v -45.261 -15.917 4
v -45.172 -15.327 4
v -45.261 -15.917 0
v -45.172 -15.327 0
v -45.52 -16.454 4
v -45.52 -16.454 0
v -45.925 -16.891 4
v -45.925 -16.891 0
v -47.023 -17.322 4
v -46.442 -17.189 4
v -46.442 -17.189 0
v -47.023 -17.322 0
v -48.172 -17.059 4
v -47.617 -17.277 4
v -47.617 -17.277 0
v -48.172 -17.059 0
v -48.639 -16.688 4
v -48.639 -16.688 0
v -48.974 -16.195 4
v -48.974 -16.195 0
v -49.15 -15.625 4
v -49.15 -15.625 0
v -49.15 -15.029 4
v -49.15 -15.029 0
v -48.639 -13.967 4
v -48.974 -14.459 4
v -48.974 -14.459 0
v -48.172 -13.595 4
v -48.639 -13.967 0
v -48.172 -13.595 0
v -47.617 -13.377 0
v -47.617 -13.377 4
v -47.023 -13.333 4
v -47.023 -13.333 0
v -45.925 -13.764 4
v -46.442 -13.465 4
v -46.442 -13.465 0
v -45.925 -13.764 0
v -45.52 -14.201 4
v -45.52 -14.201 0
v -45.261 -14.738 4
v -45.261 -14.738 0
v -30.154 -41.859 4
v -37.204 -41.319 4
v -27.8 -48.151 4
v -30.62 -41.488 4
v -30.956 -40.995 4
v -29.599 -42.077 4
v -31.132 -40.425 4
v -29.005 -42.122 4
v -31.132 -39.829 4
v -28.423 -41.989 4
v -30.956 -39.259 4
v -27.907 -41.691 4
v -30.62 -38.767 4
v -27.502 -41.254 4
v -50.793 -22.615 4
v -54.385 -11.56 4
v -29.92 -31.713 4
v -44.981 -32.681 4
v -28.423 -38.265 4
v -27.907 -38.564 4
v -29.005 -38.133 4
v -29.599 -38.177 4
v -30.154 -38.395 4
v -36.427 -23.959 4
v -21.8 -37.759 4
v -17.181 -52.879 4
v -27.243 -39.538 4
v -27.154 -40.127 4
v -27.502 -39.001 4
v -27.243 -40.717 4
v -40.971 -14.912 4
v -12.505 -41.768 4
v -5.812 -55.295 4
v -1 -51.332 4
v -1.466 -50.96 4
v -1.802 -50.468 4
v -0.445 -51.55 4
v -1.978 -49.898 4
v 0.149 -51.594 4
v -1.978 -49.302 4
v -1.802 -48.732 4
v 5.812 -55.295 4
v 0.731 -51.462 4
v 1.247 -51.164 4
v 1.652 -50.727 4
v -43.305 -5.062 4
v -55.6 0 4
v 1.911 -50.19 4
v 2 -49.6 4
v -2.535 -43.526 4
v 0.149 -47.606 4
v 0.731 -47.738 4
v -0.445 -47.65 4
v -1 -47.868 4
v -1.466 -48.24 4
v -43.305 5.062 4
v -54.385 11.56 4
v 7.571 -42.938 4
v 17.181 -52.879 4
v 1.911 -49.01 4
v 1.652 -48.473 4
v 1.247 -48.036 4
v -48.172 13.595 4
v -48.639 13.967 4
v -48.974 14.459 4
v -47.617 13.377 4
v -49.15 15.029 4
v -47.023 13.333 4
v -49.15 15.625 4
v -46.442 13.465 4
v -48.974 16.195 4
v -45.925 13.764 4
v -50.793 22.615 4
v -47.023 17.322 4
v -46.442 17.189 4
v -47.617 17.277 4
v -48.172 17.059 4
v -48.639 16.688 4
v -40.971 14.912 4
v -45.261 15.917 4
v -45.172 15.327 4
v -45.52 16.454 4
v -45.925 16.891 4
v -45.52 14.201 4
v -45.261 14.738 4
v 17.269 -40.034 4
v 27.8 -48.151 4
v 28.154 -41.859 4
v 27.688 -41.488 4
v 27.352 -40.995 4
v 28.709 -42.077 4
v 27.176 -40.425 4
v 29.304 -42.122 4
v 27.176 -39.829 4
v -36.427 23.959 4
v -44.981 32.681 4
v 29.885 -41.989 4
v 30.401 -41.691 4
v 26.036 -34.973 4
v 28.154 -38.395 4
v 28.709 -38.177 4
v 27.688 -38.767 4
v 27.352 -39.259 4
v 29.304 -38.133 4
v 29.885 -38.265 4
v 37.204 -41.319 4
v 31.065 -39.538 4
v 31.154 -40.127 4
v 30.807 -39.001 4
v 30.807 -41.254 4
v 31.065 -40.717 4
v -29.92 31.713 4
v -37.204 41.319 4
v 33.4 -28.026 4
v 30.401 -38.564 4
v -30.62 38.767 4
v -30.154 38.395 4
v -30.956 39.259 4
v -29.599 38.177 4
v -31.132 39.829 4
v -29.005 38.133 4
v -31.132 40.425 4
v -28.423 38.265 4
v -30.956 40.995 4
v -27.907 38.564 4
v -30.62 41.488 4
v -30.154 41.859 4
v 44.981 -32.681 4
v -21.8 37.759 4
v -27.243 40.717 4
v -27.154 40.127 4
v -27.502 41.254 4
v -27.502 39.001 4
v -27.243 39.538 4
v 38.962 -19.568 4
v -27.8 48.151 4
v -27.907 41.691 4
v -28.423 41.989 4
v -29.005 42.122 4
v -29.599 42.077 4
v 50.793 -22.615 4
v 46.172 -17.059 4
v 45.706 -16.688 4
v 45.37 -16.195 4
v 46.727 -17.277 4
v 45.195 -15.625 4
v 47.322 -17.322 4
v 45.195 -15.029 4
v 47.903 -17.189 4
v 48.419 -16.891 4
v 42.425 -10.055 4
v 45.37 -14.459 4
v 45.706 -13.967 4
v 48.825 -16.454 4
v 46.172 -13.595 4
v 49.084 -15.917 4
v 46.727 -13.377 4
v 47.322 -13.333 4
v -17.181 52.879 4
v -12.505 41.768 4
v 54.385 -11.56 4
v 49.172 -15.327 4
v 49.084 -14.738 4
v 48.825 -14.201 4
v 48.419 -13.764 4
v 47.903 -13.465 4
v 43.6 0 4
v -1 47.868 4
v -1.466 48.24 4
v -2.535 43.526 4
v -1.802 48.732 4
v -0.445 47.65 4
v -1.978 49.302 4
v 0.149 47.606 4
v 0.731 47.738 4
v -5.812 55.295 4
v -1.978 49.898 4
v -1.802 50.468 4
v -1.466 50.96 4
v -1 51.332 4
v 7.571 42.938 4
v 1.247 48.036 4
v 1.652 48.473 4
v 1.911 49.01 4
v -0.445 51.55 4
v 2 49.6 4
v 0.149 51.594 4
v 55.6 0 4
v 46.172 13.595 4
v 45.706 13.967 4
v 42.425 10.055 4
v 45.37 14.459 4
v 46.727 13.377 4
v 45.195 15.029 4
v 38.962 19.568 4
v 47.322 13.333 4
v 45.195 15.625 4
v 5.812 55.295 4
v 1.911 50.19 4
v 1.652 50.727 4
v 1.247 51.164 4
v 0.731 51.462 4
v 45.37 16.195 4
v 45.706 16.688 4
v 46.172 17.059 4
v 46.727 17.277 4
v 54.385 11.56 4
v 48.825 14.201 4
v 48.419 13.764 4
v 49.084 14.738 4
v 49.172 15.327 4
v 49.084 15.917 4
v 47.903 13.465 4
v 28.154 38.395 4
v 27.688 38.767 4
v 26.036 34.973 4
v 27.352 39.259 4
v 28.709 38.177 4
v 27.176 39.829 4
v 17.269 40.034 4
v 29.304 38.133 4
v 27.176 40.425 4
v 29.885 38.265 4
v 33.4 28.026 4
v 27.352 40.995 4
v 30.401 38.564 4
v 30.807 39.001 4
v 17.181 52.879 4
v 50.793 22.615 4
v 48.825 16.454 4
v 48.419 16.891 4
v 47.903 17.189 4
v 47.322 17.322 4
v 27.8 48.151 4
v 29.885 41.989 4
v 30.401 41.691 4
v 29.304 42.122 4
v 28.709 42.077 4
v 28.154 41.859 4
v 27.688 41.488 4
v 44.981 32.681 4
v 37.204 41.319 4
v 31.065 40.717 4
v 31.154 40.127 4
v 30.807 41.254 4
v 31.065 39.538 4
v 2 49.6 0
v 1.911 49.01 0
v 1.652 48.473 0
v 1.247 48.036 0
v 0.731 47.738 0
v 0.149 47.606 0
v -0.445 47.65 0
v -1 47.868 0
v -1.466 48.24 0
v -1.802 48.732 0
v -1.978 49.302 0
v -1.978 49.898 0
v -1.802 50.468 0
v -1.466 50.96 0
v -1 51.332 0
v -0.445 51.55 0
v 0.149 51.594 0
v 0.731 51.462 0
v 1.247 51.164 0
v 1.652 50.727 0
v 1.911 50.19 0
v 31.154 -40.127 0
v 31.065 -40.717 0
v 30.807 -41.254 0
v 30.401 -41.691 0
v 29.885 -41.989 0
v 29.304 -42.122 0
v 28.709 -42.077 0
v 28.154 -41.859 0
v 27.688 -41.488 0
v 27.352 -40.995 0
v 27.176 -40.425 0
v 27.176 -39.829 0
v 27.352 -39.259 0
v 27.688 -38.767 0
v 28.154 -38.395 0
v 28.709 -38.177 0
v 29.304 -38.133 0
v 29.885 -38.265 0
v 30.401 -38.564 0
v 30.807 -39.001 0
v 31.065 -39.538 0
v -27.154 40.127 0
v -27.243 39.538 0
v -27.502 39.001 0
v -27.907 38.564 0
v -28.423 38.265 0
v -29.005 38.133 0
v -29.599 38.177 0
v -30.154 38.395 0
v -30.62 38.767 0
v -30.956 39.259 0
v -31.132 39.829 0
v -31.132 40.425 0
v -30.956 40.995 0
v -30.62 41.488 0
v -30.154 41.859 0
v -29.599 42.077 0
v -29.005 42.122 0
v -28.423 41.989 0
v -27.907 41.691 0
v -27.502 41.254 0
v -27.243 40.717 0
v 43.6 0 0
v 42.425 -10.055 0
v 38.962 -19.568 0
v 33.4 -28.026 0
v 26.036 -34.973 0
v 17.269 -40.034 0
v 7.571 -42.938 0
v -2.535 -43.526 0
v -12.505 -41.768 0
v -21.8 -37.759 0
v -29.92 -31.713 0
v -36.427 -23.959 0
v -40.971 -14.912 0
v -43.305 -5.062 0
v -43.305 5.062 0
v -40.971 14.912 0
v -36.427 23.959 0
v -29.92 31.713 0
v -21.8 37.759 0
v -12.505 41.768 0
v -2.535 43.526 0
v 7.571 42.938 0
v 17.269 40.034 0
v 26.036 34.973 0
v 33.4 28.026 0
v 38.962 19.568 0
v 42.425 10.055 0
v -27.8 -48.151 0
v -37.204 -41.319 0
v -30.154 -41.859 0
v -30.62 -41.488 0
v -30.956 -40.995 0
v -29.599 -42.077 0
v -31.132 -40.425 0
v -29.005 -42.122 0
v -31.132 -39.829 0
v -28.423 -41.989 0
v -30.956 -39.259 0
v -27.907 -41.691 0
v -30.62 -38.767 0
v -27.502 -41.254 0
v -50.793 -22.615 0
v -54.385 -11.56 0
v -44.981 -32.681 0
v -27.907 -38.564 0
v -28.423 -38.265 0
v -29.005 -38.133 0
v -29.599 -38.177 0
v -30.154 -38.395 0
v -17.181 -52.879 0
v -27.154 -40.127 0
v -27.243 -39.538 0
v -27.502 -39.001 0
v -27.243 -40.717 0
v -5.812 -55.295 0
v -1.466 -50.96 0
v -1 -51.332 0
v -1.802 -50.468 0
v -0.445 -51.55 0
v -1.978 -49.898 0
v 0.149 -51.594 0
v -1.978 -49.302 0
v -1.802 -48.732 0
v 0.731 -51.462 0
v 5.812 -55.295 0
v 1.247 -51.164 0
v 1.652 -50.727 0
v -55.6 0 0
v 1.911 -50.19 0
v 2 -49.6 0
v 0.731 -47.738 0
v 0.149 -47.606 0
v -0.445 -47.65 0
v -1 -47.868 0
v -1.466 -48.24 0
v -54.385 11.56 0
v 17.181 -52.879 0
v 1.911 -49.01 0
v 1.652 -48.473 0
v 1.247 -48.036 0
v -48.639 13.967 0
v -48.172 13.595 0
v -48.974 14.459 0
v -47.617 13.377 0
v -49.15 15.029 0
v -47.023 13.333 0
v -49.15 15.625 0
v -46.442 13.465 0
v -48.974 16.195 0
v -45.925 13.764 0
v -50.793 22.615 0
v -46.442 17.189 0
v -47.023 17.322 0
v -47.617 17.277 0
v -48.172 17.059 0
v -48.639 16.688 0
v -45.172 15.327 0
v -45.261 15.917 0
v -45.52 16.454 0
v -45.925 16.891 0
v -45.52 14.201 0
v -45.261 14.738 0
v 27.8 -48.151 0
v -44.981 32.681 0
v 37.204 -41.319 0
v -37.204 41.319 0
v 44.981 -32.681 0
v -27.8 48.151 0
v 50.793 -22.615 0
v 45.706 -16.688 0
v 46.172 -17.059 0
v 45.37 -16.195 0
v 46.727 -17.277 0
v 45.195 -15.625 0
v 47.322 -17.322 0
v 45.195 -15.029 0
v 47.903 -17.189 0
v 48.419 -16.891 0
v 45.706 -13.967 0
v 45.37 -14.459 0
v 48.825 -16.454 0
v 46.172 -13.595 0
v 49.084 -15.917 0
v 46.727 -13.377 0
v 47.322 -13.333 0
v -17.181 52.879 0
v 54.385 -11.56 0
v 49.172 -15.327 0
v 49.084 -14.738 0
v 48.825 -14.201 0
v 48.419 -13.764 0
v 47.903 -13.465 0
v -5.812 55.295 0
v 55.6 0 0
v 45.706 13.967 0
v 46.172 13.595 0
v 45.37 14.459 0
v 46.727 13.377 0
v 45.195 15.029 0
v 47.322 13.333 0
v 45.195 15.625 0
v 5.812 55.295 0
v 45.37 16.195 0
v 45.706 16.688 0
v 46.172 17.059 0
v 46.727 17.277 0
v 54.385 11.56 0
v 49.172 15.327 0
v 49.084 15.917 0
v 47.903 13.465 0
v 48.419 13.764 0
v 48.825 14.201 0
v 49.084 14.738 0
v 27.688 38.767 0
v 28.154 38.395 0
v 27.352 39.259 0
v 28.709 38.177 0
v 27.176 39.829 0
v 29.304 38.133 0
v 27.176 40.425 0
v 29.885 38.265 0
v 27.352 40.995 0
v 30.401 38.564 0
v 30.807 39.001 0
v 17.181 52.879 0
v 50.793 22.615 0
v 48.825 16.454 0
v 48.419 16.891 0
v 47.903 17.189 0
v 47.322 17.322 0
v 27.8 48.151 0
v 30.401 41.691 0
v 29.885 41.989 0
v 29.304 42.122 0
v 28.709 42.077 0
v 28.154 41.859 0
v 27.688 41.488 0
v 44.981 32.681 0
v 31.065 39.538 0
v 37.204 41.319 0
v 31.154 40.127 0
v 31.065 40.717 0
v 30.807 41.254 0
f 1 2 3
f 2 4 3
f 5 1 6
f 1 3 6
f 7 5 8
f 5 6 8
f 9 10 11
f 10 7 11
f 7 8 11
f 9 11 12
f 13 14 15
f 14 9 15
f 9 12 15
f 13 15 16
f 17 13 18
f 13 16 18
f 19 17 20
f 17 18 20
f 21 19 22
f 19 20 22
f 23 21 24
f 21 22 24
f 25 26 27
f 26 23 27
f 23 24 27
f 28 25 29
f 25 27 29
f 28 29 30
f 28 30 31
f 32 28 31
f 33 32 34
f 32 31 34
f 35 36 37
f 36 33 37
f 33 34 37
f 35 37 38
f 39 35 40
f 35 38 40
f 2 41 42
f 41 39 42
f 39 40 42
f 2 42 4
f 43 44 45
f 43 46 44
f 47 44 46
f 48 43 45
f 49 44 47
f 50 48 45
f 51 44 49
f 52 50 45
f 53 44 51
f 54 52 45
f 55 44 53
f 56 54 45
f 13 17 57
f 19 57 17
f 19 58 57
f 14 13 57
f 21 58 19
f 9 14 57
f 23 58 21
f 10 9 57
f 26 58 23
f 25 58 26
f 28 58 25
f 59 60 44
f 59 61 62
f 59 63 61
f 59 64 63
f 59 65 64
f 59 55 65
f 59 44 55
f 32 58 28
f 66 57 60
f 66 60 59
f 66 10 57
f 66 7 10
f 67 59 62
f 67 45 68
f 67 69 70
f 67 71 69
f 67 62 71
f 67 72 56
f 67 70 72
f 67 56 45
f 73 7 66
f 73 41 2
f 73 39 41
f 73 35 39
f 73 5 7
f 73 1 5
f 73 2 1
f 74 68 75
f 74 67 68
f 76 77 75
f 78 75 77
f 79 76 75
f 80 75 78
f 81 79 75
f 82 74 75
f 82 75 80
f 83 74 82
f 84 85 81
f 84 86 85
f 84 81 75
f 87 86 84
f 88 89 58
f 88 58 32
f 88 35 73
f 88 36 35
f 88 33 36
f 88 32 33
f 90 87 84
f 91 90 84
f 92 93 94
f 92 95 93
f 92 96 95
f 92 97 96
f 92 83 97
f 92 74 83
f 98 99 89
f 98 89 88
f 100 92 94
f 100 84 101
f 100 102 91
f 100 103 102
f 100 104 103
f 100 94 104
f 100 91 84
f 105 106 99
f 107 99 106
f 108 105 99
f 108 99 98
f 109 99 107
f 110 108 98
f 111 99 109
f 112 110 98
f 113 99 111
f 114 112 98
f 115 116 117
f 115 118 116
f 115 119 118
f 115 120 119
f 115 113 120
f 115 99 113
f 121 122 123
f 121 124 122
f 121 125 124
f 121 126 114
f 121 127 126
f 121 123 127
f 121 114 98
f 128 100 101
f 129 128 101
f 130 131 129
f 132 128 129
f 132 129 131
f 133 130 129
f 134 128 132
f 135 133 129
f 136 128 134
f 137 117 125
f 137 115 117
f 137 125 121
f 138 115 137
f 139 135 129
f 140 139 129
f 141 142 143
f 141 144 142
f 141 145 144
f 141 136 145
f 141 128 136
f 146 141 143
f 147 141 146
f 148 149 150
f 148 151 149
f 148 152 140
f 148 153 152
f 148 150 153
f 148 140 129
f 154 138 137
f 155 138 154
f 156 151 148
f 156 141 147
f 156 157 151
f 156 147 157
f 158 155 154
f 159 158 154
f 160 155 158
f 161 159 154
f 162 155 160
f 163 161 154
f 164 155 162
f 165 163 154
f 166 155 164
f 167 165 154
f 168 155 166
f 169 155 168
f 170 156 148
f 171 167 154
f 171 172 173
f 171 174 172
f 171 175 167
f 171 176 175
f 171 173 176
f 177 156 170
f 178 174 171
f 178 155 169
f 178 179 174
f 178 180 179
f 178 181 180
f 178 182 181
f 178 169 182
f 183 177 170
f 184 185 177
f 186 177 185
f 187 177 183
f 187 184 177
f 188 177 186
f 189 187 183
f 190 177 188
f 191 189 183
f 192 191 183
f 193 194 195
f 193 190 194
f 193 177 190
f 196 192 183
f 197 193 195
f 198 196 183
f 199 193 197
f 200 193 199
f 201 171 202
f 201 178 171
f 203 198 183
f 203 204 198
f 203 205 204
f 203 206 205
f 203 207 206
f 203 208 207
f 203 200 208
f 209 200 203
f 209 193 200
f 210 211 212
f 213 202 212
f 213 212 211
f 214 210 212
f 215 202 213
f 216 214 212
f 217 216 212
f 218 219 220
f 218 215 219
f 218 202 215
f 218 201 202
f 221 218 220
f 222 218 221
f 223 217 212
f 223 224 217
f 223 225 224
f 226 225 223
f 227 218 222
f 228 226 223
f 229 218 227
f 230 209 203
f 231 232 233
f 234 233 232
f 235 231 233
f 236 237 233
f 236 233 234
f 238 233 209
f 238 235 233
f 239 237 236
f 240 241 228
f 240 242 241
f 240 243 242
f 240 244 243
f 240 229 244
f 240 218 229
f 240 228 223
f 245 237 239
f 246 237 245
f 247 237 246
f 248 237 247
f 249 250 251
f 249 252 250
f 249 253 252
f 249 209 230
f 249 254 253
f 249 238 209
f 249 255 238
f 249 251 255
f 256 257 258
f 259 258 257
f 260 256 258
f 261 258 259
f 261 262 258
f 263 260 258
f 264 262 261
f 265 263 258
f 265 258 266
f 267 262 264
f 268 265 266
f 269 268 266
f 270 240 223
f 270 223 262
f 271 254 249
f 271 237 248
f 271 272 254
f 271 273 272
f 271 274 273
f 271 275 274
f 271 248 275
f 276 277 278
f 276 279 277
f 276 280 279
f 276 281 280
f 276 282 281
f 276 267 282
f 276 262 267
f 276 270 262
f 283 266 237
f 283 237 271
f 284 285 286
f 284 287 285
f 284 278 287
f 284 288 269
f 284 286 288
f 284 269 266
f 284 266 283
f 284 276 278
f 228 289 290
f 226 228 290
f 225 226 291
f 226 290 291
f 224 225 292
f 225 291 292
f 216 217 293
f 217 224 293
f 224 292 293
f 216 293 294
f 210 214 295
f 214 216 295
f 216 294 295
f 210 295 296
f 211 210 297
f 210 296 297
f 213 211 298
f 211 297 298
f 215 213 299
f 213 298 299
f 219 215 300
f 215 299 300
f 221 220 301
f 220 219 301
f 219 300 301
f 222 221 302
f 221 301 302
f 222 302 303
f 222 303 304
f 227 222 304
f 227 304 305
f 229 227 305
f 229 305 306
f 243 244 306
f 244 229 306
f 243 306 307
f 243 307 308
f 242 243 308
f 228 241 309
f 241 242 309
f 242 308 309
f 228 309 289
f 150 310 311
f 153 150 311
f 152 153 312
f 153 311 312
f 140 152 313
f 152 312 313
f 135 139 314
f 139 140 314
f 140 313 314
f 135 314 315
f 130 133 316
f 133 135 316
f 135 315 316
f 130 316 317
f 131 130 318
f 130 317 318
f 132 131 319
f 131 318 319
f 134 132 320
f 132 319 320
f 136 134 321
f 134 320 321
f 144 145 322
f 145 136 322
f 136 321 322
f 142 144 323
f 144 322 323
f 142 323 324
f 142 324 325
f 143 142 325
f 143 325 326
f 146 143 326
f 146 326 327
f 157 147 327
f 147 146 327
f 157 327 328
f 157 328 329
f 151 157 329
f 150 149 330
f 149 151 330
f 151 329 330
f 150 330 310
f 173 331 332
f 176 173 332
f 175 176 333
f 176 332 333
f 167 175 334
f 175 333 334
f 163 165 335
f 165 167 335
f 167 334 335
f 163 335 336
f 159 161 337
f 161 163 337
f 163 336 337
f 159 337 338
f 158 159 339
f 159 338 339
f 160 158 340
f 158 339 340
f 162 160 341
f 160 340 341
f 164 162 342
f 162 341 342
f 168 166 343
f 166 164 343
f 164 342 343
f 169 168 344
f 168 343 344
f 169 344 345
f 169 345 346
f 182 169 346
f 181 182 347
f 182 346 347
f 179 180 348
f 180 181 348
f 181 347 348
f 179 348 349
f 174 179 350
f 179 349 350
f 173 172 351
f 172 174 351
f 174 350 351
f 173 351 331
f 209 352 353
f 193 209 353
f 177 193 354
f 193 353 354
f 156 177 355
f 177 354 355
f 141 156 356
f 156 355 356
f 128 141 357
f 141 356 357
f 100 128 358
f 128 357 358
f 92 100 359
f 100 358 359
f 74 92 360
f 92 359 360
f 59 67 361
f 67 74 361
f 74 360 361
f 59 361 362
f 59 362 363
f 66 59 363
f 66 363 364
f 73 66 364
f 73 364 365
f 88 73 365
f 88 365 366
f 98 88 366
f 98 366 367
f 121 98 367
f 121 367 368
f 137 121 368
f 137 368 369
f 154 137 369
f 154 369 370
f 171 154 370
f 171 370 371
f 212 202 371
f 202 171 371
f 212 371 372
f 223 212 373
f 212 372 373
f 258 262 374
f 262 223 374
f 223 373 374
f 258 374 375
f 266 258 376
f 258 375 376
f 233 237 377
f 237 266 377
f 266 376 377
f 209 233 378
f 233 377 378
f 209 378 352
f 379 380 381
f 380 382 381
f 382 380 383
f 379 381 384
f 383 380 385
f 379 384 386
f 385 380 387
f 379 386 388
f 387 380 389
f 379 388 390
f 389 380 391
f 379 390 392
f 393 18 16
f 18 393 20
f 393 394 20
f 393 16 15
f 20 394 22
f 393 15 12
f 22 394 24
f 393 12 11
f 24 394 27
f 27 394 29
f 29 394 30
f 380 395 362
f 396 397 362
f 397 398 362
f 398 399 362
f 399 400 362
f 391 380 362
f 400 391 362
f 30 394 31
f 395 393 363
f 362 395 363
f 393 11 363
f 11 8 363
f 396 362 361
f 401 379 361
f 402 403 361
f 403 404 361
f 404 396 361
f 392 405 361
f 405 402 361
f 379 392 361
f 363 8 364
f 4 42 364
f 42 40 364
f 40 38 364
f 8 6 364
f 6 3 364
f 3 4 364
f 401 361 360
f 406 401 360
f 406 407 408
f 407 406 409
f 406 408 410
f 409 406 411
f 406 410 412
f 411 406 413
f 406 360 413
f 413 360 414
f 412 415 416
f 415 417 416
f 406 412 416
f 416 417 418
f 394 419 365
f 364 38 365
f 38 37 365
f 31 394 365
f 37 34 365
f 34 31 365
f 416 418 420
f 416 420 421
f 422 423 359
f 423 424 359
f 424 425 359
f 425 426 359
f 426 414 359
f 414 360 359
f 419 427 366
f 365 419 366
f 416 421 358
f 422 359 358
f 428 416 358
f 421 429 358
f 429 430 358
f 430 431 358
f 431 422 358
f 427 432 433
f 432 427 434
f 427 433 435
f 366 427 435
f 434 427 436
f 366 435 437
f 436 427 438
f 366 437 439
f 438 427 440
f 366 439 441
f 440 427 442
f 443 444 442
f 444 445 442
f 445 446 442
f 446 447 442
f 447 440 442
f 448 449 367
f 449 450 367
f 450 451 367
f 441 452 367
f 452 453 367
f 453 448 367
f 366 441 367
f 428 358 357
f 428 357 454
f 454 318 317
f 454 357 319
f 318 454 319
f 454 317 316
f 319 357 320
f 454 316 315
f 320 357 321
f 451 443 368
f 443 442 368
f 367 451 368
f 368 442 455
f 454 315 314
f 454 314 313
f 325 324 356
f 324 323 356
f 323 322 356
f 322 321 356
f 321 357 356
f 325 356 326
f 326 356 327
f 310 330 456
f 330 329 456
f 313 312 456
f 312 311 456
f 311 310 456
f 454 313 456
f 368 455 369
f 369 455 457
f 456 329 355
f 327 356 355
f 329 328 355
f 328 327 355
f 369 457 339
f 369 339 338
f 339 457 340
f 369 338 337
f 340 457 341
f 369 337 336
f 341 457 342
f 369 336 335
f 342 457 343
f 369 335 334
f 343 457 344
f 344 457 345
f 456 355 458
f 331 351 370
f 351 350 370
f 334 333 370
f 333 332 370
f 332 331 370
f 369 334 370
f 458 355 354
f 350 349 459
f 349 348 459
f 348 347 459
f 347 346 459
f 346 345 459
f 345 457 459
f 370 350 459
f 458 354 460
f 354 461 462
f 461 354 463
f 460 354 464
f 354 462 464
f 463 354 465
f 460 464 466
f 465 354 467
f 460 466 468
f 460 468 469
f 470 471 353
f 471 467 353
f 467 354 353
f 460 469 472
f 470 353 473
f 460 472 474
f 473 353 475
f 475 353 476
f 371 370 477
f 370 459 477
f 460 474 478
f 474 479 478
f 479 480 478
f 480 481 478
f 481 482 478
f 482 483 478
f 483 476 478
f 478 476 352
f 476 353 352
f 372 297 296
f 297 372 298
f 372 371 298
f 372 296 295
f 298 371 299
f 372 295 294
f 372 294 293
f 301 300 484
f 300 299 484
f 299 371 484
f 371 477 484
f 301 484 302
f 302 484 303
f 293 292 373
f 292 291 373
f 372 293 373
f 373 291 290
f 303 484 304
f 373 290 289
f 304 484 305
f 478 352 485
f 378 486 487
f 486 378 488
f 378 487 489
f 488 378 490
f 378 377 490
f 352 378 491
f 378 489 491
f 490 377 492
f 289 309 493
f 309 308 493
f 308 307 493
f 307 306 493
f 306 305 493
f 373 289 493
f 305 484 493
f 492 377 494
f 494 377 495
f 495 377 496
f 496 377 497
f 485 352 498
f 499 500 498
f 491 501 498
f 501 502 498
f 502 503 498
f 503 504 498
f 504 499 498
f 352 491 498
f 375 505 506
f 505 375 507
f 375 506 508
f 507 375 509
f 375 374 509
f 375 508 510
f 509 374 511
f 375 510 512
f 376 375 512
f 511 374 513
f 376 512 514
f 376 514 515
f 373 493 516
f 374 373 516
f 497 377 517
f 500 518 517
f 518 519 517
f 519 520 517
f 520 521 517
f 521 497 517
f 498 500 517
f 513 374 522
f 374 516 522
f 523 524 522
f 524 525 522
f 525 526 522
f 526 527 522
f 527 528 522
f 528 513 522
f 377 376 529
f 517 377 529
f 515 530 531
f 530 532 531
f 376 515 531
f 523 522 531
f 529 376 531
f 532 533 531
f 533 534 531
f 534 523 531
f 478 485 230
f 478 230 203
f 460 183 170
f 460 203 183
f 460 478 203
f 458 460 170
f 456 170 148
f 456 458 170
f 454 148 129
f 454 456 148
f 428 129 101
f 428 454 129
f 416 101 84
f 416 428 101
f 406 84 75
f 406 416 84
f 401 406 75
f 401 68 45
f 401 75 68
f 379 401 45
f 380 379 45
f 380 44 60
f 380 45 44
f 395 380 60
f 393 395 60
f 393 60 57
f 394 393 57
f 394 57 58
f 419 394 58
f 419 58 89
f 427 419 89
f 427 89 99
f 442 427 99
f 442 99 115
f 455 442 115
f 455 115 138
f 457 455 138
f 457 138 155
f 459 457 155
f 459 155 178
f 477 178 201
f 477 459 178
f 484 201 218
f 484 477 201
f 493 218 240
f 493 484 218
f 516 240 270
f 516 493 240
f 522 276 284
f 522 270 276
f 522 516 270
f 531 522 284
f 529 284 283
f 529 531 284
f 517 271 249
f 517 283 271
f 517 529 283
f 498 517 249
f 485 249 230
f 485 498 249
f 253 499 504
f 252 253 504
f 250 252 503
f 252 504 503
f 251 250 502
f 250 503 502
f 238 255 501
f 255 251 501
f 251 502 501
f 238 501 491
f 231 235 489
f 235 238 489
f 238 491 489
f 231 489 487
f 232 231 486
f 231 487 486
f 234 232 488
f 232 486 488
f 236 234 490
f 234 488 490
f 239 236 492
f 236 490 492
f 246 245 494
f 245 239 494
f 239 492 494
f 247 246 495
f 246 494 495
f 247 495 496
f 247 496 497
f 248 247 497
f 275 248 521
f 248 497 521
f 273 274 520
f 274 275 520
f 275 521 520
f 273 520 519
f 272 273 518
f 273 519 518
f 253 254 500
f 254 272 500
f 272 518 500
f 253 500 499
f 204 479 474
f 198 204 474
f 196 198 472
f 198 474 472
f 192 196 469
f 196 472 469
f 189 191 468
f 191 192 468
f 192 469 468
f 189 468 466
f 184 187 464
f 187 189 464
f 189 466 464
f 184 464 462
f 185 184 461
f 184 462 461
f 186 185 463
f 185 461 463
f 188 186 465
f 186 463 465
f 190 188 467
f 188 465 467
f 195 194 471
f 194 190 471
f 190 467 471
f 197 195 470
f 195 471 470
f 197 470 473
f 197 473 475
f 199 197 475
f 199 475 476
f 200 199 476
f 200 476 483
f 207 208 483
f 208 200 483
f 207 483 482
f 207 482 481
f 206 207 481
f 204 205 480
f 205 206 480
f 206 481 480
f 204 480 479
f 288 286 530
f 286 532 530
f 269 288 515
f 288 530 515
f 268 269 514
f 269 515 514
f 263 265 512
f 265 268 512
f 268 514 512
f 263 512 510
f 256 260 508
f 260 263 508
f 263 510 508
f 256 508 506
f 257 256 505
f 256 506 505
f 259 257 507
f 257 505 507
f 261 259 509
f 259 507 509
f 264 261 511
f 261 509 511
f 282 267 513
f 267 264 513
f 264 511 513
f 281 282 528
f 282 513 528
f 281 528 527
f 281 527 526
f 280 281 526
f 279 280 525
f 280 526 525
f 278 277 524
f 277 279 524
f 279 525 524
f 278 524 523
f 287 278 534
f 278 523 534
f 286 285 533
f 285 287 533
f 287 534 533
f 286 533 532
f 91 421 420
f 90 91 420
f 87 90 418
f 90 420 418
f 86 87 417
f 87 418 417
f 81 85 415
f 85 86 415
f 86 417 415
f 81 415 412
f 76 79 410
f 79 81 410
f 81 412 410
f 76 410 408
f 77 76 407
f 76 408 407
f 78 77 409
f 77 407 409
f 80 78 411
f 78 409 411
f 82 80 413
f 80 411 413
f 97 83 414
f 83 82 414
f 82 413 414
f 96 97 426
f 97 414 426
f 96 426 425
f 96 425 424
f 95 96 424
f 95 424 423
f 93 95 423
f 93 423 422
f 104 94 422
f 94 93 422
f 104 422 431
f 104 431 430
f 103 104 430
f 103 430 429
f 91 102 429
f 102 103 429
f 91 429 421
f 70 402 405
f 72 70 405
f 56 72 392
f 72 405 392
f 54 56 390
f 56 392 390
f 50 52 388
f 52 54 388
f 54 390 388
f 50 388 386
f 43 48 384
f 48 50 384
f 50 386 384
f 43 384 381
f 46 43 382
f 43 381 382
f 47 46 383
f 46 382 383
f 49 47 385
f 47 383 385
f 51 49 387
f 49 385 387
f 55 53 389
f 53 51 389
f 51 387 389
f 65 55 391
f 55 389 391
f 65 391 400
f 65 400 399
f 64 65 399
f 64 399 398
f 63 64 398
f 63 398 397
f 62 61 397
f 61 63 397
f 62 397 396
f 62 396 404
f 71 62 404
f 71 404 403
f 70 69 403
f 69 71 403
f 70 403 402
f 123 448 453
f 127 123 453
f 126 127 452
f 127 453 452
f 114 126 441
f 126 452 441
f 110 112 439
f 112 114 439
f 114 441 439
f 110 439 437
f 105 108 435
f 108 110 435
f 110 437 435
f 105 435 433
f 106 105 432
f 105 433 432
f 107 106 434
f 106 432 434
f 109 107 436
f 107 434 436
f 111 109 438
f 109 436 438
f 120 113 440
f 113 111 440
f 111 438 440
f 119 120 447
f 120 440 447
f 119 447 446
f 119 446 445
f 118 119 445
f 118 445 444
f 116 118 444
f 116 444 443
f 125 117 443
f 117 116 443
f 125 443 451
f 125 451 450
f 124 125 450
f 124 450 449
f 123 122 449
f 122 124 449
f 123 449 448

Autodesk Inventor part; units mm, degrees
ref_plane "YZ Plane" through (0, 0, 0) normal (1, 0, 0) x (0, 1, 0)
ref_plane "XZ Plane" through (0, 0, 0) normal (0, 1, 0) x (-1, 0, 0)
ref_plane "XY Plane" through (0, 0, 0) normal (0, 0, 1) x (1, 0, 0)
ref_plane "Work Plane1" through (0, 0, 0) normal (0, 0, 1) x (1, 0, 0)
sketch "Sketch1" plane through (0, 0, 0) normal (0, 0, 1) x (1, 0, 0)
  circle A0 centre (-29.1541, -40.1272) radius 2 projected
  circle A1 centre (-47.1724, -15.3272) radius 2 projected
  circle A2 centre (-47.1724, 15.3272) radius 2 projected
  circle A3 centre (-29.1541, 40.1272) radius 2 projected
  circle A4 centre (0, 49.6) radius 2 projected
  circle A5 centre (29.1541, 40.1272) radius 2 projected
  circle A6 centre (47.1724, 15.3272) radius 2 projected
  circle A7 centre (47.1724, -15.3272) radius 2 projected
  circle A8 centre (29.1541, -40.1272) radius 2 projected
  circle A9 centre (0, -49.6) radius 2 projected
  circle A10 centre (0, 0) radius 55.6 projected
  circle A11 centre (0, 0) radius 43.6
  dimension "d0" = 12
extrude "Extrusion1" add sketch "Sketch1" along normal blind 4
properties part number "Anglerfish_3inch_tube_pressurering"
